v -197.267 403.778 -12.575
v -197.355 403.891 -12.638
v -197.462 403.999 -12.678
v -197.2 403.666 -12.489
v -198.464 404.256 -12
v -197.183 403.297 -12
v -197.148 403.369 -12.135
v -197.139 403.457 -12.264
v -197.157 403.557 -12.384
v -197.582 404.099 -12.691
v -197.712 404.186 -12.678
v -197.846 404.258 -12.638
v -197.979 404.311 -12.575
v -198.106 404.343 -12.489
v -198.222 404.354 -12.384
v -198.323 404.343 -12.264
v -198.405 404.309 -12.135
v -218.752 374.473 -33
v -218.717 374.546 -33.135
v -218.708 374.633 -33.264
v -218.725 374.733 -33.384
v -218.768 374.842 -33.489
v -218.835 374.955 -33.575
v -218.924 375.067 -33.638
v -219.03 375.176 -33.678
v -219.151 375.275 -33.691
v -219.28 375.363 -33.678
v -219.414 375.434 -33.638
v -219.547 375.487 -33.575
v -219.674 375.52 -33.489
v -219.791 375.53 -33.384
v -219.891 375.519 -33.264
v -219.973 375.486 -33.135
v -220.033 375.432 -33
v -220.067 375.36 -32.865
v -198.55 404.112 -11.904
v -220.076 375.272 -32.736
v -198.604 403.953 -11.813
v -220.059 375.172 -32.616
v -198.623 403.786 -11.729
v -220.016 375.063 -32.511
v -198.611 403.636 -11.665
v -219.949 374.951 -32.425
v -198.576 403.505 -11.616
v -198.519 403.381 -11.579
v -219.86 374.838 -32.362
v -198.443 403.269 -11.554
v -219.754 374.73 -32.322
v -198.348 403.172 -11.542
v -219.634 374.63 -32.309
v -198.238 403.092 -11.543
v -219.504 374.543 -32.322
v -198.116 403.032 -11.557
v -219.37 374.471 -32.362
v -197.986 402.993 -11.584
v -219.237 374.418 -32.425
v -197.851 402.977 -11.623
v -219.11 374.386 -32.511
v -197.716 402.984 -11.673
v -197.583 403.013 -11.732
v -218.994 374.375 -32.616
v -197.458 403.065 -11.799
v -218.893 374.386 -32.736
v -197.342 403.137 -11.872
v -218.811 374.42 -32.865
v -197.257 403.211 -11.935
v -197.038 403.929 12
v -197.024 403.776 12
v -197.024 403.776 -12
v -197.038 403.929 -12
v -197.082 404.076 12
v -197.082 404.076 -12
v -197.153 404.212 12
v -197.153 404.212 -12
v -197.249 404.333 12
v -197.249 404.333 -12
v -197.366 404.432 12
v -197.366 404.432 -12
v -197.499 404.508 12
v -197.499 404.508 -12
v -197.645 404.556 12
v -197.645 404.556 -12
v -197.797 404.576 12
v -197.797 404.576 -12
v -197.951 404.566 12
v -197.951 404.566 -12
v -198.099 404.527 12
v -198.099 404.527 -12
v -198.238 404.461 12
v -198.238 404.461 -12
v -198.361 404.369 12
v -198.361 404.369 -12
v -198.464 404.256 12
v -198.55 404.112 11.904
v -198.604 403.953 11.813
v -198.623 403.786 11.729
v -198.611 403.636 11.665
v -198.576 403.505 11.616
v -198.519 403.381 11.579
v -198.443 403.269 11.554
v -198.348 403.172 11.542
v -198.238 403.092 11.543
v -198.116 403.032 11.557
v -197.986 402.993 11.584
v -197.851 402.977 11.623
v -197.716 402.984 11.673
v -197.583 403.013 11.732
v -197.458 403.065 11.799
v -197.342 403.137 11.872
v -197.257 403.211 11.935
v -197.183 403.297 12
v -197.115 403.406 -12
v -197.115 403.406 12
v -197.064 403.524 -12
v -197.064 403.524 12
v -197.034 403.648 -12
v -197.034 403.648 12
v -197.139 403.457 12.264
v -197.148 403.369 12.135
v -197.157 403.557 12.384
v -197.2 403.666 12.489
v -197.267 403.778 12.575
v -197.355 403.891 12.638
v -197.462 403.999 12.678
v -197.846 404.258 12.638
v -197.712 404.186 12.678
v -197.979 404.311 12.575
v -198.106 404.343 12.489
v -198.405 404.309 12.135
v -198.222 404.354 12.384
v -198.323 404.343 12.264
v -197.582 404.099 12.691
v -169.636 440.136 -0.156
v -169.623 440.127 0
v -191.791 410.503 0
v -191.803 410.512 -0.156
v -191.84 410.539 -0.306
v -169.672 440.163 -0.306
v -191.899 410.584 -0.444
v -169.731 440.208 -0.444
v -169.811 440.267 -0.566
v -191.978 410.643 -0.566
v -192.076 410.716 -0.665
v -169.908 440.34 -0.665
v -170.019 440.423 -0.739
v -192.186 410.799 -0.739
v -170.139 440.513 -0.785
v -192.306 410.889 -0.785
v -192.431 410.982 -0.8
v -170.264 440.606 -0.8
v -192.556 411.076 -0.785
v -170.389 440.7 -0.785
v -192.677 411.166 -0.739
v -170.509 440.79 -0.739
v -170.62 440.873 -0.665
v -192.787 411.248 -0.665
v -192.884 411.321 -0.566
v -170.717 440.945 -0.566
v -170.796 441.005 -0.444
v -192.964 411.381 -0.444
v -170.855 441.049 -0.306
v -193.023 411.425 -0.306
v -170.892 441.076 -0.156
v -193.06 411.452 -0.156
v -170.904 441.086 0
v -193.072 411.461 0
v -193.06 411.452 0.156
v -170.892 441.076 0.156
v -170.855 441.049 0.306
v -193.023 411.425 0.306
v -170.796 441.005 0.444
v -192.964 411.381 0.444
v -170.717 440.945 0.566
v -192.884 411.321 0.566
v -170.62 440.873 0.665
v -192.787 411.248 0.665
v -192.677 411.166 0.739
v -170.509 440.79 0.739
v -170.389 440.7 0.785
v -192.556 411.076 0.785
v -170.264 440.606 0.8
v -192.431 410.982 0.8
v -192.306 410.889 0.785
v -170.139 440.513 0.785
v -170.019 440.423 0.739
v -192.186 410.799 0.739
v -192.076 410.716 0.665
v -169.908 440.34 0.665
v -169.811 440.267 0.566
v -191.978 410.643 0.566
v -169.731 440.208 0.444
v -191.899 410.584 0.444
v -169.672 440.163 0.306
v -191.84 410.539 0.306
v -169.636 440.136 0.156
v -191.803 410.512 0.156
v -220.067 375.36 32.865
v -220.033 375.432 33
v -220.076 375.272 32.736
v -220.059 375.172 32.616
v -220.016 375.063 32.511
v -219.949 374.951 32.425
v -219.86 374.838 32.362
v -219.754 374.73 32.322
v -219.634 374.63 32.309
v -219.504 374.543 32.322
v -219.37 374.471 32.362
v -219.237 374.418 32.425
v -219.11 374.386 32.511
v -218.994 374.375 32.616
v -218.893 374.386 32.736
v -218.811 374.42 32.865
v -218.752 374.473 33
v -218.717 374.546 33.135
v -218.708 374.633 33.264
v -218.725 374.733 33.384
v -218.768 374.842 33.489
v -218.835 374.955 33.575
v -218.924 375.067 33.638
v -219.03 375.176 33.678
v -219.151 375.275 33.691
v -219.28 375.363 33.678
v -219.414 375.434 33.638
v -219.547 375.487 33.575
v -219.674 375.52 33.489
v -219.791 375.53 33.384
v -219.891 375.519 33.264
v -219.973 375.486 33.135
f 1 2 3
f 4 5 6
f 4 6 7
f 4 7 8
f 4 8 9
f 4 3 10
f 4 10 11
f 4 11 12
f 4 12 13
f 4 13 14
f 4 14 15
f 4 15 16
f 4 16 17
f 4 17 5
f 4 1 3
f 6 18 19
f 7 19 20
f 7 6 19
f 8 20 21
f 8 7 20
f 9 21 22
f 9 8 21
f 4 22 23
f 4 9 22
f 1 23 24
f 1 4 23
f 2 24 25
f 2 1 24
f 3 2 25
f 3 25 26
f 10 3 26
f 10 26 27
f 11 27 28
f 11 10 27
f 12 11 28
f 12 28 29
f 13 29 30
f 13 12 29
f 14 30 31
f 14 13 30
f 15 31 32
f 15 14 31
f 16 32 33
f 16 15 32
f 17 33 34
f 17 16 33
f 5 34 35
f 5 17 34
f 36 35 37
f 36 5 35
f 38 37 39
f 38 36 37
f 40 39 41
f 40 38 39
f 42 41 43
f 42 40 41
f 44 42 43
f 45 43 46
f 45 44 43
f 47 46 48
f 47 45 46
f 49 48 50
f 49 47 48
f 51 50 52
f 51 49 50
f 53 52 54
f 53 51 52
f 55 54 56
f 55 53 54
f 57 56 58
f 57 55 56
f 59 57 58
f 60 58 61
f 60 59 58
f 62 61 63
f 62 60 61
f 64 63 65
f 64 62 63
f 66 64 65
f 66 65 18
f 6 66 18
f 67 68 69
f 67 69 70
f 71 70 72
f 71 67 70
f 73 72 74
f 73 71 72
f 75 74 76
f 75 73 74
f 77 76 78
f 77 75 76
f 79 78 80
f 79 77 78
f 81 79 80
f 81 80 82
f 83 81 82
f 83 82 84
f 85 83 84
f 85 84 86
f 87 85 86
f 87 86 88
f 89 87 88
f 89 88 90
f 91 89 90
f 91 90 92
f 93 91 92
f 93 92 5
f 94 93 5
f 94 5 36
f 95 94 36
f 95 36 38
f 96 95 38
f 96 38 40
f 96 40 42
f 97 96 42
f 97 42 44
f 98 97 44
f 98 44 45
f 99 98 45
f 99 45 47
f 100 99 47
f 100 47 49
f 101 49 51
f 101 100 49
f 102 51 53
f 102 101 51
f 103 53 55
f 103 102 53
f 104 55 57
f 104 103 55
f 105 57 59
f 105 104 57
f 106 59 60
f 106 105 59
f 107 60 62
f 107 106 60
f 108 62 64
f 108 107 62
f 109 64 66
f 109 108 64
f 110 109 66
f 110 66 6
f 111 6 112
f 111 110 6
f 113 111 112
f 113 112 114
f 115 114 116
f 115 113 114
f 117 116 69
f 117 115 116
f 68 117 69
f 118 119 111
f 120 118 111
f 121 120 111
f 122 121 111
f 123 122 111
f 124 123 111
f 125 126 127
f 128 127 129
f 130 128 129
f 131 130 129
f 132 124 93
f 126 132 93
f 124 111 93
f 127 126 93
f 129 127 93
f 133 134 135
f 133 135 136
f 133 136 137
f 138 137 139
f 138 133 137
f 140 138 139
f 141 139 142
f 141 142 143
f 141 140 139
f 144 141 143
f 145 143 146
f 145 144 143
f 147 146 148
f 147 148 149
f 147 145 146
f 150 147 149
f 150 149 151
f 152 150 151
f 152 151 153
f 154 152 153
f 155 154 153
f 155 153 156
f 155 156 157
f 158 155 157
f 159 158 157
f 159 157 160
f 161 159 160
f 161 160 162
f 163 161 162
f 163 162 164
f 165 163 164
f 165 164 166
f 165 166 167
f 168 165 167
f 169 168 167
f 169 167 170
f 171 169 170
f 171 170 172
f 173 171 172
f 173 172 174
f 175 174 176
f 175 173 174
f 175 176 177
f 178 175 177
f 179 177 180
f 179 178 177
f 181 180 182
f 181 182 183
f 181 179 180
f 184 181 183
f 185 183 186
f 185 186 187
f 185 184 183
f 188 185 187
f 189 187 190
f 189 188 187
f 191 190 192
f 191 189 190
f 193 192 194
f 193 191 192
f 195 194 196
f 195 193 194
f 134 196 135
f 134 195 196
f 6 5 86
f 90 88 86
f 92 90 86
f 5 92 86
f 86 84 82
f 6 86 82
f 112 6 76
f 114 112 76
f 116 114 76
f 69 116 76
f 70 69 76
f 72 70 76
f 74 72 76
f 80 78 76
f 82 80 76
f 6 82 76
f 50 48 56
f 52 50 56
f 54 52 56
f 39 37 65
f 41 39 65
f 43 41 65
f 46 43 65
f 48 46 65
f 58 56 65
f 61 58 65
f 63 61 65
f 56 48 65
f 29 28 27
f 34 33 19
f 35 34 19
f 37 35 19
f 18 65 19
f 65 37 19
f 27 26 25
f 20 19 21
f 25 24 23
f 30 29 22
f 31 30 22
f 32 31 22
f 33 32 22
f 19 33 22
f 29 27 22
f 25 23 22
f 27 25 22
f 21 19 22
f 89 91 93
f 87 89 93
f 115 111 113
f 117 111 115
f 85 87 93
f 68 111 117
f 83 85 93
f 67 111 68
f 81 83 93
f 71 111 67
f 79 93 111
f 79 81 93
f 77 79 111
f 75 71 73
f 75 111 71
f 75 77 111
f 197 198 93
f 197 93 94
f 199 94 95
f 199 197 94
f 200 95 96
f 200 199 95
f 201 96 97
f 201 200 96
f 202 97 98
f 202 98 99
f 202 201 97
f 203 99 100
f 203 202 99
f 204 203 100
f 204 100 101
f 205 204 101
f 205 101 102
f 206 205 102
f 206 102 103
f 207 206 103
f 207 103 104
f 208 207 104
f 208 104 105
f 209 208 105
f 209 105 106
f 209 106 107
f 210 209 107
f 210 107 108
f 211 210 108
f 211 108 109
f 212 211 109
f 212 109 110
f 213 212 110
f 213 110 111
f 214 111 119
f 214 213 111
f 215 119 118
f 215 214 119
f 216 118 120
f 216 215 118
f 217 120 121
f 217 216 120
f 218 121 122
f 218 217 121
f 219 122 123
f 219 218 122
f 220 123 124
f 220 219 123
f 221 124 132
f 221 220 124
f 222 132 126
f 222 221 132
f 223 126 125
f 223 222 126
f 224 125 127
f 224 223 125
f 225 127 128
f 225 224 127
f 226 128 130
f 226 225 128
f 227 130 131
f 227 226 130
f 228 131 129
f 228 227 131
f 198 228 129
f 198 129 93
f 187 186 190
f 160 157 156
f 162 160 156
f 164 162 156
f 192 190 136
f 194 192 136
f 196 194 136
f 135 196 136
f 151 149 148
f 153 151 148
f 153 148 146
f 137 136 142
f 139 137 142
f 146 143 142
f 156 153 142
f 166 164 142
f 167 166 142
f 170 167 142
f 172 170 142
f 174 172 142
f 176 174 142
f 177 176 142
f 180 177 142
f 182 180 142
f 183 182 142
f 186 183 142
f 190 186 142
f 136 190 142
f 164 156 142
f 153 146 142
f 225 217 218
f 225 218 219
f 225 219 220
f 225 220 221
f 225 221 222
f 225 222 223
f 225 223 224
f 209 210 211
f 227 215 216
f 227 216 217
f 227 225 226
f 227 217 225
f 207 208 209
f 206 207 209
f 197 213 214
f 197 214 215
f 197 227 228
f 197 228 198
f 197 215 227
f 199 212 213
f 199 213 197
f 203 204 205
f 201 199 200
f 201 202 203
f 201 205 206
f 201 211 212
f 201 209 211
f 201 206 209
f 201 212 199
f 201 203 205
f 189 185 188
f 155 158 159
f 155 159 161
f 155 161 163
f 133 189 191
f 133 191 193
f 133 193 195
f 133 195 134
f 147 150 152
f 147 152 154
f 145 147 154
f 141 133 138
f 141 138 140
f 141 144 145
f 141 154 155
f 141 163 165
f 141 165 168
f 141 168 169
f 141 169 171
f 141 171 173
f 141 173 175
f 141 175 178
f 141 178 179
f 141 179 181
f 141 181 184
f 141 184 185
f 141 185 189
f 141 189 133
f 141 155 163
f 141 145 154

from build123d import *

# Parameters (mm, degrees)
CABLE_PUENTE_1_PROFILE_R = 0.8
CABLE_PUENTE_2_PROFILE_R = 0.8
CABLE_PUENTE_3_PROFILE_R = 0.8
CABLE_TIRO_PROFILE_R     = 0.8


with BuildPart() as part:
    # Cable_puente_1: sweep along a curve in space
    with BuildLine() as cable_puente_1_path:
        Line((-219.39211406, 374.952663744, -33), (-197.823554986, 403.776217645, -12))
    # Cable_puente_1 profile (on start of the path) → Cable_puente_1 (sweep)
    with BuildSketch(Plane(origin=(-219.39211406, 374.952663744, -33), x_dir=(0.8006542750173851, -0.5991266409502967, 0), z_dir=(0.5175129514190178, 0.691588269674149, 0.5038710255240859))):
        Circle(CABLE_PUENTE_1_PROFILE_R)
    sweep(path=cable_puente_1_path.line)

    # Cable_puente_2: sweep along a curve in space
    with BuildLine() as cable_puente_2_path:
        Line((-197.823554986, 403.776217645, -12), (-197.823554986, 403.776217645, 12))
    # Cable_puente_2 profile (on start of the path) → Cable_puente_2 (sweep)
    with BuildSketch(Plane(origin=(-197.823554986, 403.776217645, -12), x_dir=(1, 0, 0), z_dir=(0, 0, 1))):
        Circle(CABLE_PUENTE_2_PROFILE_R)
    sweep(path=cable_puente_2_path.line)

    # Cable_puente_3: sweep along a curve in space
    with BuildLine() as cable_puente_3_path:
        Line((-197.823554986, 403.776217645, 12), (-219.39211406, 374.952663744, 33))
    # Cable_puente_3 profile (on start of the path) → Cable_puente_3 (sweep)
    with BuildSketch(Plane(origin=(-197.823554986, 403.776217645, 12), x_dir=(-0.8006542750173851, 0.5991266409502967, 0), z_dir=(-0.5175129514190178, -0.691588269674149, 0.5038710255240859))):
        Circle(CABLE_PUENTE_3_PROFILE_R)
    sweep(path=cable_puente_3_path.line)


with BuildPart() as body_2:
    # Cable_tiro: sweep along a curve in space
    with BuildLine() as cable_tiro_path:
        Line((-192.431415217, 410.98210612, 0), (-170.263729502, 440.606314296, 0))
    # Cable_tiro profile (on start of the path) → Cable_tiro (sweep)
    with BuildSketch(Plane(origin=(-192.431415217, 410.98210612, 0), x_dir=(0.8006542750173848, -0.599126640950297, 0), z_dir=(0.599126640950297, 0.8006542750173848, 0))):
        Circle(CABLE_TIRO_PROFILE_R)
    sweep(path=cable_tiro_path.line)


solid = Compound([part.part, body_2.part])
